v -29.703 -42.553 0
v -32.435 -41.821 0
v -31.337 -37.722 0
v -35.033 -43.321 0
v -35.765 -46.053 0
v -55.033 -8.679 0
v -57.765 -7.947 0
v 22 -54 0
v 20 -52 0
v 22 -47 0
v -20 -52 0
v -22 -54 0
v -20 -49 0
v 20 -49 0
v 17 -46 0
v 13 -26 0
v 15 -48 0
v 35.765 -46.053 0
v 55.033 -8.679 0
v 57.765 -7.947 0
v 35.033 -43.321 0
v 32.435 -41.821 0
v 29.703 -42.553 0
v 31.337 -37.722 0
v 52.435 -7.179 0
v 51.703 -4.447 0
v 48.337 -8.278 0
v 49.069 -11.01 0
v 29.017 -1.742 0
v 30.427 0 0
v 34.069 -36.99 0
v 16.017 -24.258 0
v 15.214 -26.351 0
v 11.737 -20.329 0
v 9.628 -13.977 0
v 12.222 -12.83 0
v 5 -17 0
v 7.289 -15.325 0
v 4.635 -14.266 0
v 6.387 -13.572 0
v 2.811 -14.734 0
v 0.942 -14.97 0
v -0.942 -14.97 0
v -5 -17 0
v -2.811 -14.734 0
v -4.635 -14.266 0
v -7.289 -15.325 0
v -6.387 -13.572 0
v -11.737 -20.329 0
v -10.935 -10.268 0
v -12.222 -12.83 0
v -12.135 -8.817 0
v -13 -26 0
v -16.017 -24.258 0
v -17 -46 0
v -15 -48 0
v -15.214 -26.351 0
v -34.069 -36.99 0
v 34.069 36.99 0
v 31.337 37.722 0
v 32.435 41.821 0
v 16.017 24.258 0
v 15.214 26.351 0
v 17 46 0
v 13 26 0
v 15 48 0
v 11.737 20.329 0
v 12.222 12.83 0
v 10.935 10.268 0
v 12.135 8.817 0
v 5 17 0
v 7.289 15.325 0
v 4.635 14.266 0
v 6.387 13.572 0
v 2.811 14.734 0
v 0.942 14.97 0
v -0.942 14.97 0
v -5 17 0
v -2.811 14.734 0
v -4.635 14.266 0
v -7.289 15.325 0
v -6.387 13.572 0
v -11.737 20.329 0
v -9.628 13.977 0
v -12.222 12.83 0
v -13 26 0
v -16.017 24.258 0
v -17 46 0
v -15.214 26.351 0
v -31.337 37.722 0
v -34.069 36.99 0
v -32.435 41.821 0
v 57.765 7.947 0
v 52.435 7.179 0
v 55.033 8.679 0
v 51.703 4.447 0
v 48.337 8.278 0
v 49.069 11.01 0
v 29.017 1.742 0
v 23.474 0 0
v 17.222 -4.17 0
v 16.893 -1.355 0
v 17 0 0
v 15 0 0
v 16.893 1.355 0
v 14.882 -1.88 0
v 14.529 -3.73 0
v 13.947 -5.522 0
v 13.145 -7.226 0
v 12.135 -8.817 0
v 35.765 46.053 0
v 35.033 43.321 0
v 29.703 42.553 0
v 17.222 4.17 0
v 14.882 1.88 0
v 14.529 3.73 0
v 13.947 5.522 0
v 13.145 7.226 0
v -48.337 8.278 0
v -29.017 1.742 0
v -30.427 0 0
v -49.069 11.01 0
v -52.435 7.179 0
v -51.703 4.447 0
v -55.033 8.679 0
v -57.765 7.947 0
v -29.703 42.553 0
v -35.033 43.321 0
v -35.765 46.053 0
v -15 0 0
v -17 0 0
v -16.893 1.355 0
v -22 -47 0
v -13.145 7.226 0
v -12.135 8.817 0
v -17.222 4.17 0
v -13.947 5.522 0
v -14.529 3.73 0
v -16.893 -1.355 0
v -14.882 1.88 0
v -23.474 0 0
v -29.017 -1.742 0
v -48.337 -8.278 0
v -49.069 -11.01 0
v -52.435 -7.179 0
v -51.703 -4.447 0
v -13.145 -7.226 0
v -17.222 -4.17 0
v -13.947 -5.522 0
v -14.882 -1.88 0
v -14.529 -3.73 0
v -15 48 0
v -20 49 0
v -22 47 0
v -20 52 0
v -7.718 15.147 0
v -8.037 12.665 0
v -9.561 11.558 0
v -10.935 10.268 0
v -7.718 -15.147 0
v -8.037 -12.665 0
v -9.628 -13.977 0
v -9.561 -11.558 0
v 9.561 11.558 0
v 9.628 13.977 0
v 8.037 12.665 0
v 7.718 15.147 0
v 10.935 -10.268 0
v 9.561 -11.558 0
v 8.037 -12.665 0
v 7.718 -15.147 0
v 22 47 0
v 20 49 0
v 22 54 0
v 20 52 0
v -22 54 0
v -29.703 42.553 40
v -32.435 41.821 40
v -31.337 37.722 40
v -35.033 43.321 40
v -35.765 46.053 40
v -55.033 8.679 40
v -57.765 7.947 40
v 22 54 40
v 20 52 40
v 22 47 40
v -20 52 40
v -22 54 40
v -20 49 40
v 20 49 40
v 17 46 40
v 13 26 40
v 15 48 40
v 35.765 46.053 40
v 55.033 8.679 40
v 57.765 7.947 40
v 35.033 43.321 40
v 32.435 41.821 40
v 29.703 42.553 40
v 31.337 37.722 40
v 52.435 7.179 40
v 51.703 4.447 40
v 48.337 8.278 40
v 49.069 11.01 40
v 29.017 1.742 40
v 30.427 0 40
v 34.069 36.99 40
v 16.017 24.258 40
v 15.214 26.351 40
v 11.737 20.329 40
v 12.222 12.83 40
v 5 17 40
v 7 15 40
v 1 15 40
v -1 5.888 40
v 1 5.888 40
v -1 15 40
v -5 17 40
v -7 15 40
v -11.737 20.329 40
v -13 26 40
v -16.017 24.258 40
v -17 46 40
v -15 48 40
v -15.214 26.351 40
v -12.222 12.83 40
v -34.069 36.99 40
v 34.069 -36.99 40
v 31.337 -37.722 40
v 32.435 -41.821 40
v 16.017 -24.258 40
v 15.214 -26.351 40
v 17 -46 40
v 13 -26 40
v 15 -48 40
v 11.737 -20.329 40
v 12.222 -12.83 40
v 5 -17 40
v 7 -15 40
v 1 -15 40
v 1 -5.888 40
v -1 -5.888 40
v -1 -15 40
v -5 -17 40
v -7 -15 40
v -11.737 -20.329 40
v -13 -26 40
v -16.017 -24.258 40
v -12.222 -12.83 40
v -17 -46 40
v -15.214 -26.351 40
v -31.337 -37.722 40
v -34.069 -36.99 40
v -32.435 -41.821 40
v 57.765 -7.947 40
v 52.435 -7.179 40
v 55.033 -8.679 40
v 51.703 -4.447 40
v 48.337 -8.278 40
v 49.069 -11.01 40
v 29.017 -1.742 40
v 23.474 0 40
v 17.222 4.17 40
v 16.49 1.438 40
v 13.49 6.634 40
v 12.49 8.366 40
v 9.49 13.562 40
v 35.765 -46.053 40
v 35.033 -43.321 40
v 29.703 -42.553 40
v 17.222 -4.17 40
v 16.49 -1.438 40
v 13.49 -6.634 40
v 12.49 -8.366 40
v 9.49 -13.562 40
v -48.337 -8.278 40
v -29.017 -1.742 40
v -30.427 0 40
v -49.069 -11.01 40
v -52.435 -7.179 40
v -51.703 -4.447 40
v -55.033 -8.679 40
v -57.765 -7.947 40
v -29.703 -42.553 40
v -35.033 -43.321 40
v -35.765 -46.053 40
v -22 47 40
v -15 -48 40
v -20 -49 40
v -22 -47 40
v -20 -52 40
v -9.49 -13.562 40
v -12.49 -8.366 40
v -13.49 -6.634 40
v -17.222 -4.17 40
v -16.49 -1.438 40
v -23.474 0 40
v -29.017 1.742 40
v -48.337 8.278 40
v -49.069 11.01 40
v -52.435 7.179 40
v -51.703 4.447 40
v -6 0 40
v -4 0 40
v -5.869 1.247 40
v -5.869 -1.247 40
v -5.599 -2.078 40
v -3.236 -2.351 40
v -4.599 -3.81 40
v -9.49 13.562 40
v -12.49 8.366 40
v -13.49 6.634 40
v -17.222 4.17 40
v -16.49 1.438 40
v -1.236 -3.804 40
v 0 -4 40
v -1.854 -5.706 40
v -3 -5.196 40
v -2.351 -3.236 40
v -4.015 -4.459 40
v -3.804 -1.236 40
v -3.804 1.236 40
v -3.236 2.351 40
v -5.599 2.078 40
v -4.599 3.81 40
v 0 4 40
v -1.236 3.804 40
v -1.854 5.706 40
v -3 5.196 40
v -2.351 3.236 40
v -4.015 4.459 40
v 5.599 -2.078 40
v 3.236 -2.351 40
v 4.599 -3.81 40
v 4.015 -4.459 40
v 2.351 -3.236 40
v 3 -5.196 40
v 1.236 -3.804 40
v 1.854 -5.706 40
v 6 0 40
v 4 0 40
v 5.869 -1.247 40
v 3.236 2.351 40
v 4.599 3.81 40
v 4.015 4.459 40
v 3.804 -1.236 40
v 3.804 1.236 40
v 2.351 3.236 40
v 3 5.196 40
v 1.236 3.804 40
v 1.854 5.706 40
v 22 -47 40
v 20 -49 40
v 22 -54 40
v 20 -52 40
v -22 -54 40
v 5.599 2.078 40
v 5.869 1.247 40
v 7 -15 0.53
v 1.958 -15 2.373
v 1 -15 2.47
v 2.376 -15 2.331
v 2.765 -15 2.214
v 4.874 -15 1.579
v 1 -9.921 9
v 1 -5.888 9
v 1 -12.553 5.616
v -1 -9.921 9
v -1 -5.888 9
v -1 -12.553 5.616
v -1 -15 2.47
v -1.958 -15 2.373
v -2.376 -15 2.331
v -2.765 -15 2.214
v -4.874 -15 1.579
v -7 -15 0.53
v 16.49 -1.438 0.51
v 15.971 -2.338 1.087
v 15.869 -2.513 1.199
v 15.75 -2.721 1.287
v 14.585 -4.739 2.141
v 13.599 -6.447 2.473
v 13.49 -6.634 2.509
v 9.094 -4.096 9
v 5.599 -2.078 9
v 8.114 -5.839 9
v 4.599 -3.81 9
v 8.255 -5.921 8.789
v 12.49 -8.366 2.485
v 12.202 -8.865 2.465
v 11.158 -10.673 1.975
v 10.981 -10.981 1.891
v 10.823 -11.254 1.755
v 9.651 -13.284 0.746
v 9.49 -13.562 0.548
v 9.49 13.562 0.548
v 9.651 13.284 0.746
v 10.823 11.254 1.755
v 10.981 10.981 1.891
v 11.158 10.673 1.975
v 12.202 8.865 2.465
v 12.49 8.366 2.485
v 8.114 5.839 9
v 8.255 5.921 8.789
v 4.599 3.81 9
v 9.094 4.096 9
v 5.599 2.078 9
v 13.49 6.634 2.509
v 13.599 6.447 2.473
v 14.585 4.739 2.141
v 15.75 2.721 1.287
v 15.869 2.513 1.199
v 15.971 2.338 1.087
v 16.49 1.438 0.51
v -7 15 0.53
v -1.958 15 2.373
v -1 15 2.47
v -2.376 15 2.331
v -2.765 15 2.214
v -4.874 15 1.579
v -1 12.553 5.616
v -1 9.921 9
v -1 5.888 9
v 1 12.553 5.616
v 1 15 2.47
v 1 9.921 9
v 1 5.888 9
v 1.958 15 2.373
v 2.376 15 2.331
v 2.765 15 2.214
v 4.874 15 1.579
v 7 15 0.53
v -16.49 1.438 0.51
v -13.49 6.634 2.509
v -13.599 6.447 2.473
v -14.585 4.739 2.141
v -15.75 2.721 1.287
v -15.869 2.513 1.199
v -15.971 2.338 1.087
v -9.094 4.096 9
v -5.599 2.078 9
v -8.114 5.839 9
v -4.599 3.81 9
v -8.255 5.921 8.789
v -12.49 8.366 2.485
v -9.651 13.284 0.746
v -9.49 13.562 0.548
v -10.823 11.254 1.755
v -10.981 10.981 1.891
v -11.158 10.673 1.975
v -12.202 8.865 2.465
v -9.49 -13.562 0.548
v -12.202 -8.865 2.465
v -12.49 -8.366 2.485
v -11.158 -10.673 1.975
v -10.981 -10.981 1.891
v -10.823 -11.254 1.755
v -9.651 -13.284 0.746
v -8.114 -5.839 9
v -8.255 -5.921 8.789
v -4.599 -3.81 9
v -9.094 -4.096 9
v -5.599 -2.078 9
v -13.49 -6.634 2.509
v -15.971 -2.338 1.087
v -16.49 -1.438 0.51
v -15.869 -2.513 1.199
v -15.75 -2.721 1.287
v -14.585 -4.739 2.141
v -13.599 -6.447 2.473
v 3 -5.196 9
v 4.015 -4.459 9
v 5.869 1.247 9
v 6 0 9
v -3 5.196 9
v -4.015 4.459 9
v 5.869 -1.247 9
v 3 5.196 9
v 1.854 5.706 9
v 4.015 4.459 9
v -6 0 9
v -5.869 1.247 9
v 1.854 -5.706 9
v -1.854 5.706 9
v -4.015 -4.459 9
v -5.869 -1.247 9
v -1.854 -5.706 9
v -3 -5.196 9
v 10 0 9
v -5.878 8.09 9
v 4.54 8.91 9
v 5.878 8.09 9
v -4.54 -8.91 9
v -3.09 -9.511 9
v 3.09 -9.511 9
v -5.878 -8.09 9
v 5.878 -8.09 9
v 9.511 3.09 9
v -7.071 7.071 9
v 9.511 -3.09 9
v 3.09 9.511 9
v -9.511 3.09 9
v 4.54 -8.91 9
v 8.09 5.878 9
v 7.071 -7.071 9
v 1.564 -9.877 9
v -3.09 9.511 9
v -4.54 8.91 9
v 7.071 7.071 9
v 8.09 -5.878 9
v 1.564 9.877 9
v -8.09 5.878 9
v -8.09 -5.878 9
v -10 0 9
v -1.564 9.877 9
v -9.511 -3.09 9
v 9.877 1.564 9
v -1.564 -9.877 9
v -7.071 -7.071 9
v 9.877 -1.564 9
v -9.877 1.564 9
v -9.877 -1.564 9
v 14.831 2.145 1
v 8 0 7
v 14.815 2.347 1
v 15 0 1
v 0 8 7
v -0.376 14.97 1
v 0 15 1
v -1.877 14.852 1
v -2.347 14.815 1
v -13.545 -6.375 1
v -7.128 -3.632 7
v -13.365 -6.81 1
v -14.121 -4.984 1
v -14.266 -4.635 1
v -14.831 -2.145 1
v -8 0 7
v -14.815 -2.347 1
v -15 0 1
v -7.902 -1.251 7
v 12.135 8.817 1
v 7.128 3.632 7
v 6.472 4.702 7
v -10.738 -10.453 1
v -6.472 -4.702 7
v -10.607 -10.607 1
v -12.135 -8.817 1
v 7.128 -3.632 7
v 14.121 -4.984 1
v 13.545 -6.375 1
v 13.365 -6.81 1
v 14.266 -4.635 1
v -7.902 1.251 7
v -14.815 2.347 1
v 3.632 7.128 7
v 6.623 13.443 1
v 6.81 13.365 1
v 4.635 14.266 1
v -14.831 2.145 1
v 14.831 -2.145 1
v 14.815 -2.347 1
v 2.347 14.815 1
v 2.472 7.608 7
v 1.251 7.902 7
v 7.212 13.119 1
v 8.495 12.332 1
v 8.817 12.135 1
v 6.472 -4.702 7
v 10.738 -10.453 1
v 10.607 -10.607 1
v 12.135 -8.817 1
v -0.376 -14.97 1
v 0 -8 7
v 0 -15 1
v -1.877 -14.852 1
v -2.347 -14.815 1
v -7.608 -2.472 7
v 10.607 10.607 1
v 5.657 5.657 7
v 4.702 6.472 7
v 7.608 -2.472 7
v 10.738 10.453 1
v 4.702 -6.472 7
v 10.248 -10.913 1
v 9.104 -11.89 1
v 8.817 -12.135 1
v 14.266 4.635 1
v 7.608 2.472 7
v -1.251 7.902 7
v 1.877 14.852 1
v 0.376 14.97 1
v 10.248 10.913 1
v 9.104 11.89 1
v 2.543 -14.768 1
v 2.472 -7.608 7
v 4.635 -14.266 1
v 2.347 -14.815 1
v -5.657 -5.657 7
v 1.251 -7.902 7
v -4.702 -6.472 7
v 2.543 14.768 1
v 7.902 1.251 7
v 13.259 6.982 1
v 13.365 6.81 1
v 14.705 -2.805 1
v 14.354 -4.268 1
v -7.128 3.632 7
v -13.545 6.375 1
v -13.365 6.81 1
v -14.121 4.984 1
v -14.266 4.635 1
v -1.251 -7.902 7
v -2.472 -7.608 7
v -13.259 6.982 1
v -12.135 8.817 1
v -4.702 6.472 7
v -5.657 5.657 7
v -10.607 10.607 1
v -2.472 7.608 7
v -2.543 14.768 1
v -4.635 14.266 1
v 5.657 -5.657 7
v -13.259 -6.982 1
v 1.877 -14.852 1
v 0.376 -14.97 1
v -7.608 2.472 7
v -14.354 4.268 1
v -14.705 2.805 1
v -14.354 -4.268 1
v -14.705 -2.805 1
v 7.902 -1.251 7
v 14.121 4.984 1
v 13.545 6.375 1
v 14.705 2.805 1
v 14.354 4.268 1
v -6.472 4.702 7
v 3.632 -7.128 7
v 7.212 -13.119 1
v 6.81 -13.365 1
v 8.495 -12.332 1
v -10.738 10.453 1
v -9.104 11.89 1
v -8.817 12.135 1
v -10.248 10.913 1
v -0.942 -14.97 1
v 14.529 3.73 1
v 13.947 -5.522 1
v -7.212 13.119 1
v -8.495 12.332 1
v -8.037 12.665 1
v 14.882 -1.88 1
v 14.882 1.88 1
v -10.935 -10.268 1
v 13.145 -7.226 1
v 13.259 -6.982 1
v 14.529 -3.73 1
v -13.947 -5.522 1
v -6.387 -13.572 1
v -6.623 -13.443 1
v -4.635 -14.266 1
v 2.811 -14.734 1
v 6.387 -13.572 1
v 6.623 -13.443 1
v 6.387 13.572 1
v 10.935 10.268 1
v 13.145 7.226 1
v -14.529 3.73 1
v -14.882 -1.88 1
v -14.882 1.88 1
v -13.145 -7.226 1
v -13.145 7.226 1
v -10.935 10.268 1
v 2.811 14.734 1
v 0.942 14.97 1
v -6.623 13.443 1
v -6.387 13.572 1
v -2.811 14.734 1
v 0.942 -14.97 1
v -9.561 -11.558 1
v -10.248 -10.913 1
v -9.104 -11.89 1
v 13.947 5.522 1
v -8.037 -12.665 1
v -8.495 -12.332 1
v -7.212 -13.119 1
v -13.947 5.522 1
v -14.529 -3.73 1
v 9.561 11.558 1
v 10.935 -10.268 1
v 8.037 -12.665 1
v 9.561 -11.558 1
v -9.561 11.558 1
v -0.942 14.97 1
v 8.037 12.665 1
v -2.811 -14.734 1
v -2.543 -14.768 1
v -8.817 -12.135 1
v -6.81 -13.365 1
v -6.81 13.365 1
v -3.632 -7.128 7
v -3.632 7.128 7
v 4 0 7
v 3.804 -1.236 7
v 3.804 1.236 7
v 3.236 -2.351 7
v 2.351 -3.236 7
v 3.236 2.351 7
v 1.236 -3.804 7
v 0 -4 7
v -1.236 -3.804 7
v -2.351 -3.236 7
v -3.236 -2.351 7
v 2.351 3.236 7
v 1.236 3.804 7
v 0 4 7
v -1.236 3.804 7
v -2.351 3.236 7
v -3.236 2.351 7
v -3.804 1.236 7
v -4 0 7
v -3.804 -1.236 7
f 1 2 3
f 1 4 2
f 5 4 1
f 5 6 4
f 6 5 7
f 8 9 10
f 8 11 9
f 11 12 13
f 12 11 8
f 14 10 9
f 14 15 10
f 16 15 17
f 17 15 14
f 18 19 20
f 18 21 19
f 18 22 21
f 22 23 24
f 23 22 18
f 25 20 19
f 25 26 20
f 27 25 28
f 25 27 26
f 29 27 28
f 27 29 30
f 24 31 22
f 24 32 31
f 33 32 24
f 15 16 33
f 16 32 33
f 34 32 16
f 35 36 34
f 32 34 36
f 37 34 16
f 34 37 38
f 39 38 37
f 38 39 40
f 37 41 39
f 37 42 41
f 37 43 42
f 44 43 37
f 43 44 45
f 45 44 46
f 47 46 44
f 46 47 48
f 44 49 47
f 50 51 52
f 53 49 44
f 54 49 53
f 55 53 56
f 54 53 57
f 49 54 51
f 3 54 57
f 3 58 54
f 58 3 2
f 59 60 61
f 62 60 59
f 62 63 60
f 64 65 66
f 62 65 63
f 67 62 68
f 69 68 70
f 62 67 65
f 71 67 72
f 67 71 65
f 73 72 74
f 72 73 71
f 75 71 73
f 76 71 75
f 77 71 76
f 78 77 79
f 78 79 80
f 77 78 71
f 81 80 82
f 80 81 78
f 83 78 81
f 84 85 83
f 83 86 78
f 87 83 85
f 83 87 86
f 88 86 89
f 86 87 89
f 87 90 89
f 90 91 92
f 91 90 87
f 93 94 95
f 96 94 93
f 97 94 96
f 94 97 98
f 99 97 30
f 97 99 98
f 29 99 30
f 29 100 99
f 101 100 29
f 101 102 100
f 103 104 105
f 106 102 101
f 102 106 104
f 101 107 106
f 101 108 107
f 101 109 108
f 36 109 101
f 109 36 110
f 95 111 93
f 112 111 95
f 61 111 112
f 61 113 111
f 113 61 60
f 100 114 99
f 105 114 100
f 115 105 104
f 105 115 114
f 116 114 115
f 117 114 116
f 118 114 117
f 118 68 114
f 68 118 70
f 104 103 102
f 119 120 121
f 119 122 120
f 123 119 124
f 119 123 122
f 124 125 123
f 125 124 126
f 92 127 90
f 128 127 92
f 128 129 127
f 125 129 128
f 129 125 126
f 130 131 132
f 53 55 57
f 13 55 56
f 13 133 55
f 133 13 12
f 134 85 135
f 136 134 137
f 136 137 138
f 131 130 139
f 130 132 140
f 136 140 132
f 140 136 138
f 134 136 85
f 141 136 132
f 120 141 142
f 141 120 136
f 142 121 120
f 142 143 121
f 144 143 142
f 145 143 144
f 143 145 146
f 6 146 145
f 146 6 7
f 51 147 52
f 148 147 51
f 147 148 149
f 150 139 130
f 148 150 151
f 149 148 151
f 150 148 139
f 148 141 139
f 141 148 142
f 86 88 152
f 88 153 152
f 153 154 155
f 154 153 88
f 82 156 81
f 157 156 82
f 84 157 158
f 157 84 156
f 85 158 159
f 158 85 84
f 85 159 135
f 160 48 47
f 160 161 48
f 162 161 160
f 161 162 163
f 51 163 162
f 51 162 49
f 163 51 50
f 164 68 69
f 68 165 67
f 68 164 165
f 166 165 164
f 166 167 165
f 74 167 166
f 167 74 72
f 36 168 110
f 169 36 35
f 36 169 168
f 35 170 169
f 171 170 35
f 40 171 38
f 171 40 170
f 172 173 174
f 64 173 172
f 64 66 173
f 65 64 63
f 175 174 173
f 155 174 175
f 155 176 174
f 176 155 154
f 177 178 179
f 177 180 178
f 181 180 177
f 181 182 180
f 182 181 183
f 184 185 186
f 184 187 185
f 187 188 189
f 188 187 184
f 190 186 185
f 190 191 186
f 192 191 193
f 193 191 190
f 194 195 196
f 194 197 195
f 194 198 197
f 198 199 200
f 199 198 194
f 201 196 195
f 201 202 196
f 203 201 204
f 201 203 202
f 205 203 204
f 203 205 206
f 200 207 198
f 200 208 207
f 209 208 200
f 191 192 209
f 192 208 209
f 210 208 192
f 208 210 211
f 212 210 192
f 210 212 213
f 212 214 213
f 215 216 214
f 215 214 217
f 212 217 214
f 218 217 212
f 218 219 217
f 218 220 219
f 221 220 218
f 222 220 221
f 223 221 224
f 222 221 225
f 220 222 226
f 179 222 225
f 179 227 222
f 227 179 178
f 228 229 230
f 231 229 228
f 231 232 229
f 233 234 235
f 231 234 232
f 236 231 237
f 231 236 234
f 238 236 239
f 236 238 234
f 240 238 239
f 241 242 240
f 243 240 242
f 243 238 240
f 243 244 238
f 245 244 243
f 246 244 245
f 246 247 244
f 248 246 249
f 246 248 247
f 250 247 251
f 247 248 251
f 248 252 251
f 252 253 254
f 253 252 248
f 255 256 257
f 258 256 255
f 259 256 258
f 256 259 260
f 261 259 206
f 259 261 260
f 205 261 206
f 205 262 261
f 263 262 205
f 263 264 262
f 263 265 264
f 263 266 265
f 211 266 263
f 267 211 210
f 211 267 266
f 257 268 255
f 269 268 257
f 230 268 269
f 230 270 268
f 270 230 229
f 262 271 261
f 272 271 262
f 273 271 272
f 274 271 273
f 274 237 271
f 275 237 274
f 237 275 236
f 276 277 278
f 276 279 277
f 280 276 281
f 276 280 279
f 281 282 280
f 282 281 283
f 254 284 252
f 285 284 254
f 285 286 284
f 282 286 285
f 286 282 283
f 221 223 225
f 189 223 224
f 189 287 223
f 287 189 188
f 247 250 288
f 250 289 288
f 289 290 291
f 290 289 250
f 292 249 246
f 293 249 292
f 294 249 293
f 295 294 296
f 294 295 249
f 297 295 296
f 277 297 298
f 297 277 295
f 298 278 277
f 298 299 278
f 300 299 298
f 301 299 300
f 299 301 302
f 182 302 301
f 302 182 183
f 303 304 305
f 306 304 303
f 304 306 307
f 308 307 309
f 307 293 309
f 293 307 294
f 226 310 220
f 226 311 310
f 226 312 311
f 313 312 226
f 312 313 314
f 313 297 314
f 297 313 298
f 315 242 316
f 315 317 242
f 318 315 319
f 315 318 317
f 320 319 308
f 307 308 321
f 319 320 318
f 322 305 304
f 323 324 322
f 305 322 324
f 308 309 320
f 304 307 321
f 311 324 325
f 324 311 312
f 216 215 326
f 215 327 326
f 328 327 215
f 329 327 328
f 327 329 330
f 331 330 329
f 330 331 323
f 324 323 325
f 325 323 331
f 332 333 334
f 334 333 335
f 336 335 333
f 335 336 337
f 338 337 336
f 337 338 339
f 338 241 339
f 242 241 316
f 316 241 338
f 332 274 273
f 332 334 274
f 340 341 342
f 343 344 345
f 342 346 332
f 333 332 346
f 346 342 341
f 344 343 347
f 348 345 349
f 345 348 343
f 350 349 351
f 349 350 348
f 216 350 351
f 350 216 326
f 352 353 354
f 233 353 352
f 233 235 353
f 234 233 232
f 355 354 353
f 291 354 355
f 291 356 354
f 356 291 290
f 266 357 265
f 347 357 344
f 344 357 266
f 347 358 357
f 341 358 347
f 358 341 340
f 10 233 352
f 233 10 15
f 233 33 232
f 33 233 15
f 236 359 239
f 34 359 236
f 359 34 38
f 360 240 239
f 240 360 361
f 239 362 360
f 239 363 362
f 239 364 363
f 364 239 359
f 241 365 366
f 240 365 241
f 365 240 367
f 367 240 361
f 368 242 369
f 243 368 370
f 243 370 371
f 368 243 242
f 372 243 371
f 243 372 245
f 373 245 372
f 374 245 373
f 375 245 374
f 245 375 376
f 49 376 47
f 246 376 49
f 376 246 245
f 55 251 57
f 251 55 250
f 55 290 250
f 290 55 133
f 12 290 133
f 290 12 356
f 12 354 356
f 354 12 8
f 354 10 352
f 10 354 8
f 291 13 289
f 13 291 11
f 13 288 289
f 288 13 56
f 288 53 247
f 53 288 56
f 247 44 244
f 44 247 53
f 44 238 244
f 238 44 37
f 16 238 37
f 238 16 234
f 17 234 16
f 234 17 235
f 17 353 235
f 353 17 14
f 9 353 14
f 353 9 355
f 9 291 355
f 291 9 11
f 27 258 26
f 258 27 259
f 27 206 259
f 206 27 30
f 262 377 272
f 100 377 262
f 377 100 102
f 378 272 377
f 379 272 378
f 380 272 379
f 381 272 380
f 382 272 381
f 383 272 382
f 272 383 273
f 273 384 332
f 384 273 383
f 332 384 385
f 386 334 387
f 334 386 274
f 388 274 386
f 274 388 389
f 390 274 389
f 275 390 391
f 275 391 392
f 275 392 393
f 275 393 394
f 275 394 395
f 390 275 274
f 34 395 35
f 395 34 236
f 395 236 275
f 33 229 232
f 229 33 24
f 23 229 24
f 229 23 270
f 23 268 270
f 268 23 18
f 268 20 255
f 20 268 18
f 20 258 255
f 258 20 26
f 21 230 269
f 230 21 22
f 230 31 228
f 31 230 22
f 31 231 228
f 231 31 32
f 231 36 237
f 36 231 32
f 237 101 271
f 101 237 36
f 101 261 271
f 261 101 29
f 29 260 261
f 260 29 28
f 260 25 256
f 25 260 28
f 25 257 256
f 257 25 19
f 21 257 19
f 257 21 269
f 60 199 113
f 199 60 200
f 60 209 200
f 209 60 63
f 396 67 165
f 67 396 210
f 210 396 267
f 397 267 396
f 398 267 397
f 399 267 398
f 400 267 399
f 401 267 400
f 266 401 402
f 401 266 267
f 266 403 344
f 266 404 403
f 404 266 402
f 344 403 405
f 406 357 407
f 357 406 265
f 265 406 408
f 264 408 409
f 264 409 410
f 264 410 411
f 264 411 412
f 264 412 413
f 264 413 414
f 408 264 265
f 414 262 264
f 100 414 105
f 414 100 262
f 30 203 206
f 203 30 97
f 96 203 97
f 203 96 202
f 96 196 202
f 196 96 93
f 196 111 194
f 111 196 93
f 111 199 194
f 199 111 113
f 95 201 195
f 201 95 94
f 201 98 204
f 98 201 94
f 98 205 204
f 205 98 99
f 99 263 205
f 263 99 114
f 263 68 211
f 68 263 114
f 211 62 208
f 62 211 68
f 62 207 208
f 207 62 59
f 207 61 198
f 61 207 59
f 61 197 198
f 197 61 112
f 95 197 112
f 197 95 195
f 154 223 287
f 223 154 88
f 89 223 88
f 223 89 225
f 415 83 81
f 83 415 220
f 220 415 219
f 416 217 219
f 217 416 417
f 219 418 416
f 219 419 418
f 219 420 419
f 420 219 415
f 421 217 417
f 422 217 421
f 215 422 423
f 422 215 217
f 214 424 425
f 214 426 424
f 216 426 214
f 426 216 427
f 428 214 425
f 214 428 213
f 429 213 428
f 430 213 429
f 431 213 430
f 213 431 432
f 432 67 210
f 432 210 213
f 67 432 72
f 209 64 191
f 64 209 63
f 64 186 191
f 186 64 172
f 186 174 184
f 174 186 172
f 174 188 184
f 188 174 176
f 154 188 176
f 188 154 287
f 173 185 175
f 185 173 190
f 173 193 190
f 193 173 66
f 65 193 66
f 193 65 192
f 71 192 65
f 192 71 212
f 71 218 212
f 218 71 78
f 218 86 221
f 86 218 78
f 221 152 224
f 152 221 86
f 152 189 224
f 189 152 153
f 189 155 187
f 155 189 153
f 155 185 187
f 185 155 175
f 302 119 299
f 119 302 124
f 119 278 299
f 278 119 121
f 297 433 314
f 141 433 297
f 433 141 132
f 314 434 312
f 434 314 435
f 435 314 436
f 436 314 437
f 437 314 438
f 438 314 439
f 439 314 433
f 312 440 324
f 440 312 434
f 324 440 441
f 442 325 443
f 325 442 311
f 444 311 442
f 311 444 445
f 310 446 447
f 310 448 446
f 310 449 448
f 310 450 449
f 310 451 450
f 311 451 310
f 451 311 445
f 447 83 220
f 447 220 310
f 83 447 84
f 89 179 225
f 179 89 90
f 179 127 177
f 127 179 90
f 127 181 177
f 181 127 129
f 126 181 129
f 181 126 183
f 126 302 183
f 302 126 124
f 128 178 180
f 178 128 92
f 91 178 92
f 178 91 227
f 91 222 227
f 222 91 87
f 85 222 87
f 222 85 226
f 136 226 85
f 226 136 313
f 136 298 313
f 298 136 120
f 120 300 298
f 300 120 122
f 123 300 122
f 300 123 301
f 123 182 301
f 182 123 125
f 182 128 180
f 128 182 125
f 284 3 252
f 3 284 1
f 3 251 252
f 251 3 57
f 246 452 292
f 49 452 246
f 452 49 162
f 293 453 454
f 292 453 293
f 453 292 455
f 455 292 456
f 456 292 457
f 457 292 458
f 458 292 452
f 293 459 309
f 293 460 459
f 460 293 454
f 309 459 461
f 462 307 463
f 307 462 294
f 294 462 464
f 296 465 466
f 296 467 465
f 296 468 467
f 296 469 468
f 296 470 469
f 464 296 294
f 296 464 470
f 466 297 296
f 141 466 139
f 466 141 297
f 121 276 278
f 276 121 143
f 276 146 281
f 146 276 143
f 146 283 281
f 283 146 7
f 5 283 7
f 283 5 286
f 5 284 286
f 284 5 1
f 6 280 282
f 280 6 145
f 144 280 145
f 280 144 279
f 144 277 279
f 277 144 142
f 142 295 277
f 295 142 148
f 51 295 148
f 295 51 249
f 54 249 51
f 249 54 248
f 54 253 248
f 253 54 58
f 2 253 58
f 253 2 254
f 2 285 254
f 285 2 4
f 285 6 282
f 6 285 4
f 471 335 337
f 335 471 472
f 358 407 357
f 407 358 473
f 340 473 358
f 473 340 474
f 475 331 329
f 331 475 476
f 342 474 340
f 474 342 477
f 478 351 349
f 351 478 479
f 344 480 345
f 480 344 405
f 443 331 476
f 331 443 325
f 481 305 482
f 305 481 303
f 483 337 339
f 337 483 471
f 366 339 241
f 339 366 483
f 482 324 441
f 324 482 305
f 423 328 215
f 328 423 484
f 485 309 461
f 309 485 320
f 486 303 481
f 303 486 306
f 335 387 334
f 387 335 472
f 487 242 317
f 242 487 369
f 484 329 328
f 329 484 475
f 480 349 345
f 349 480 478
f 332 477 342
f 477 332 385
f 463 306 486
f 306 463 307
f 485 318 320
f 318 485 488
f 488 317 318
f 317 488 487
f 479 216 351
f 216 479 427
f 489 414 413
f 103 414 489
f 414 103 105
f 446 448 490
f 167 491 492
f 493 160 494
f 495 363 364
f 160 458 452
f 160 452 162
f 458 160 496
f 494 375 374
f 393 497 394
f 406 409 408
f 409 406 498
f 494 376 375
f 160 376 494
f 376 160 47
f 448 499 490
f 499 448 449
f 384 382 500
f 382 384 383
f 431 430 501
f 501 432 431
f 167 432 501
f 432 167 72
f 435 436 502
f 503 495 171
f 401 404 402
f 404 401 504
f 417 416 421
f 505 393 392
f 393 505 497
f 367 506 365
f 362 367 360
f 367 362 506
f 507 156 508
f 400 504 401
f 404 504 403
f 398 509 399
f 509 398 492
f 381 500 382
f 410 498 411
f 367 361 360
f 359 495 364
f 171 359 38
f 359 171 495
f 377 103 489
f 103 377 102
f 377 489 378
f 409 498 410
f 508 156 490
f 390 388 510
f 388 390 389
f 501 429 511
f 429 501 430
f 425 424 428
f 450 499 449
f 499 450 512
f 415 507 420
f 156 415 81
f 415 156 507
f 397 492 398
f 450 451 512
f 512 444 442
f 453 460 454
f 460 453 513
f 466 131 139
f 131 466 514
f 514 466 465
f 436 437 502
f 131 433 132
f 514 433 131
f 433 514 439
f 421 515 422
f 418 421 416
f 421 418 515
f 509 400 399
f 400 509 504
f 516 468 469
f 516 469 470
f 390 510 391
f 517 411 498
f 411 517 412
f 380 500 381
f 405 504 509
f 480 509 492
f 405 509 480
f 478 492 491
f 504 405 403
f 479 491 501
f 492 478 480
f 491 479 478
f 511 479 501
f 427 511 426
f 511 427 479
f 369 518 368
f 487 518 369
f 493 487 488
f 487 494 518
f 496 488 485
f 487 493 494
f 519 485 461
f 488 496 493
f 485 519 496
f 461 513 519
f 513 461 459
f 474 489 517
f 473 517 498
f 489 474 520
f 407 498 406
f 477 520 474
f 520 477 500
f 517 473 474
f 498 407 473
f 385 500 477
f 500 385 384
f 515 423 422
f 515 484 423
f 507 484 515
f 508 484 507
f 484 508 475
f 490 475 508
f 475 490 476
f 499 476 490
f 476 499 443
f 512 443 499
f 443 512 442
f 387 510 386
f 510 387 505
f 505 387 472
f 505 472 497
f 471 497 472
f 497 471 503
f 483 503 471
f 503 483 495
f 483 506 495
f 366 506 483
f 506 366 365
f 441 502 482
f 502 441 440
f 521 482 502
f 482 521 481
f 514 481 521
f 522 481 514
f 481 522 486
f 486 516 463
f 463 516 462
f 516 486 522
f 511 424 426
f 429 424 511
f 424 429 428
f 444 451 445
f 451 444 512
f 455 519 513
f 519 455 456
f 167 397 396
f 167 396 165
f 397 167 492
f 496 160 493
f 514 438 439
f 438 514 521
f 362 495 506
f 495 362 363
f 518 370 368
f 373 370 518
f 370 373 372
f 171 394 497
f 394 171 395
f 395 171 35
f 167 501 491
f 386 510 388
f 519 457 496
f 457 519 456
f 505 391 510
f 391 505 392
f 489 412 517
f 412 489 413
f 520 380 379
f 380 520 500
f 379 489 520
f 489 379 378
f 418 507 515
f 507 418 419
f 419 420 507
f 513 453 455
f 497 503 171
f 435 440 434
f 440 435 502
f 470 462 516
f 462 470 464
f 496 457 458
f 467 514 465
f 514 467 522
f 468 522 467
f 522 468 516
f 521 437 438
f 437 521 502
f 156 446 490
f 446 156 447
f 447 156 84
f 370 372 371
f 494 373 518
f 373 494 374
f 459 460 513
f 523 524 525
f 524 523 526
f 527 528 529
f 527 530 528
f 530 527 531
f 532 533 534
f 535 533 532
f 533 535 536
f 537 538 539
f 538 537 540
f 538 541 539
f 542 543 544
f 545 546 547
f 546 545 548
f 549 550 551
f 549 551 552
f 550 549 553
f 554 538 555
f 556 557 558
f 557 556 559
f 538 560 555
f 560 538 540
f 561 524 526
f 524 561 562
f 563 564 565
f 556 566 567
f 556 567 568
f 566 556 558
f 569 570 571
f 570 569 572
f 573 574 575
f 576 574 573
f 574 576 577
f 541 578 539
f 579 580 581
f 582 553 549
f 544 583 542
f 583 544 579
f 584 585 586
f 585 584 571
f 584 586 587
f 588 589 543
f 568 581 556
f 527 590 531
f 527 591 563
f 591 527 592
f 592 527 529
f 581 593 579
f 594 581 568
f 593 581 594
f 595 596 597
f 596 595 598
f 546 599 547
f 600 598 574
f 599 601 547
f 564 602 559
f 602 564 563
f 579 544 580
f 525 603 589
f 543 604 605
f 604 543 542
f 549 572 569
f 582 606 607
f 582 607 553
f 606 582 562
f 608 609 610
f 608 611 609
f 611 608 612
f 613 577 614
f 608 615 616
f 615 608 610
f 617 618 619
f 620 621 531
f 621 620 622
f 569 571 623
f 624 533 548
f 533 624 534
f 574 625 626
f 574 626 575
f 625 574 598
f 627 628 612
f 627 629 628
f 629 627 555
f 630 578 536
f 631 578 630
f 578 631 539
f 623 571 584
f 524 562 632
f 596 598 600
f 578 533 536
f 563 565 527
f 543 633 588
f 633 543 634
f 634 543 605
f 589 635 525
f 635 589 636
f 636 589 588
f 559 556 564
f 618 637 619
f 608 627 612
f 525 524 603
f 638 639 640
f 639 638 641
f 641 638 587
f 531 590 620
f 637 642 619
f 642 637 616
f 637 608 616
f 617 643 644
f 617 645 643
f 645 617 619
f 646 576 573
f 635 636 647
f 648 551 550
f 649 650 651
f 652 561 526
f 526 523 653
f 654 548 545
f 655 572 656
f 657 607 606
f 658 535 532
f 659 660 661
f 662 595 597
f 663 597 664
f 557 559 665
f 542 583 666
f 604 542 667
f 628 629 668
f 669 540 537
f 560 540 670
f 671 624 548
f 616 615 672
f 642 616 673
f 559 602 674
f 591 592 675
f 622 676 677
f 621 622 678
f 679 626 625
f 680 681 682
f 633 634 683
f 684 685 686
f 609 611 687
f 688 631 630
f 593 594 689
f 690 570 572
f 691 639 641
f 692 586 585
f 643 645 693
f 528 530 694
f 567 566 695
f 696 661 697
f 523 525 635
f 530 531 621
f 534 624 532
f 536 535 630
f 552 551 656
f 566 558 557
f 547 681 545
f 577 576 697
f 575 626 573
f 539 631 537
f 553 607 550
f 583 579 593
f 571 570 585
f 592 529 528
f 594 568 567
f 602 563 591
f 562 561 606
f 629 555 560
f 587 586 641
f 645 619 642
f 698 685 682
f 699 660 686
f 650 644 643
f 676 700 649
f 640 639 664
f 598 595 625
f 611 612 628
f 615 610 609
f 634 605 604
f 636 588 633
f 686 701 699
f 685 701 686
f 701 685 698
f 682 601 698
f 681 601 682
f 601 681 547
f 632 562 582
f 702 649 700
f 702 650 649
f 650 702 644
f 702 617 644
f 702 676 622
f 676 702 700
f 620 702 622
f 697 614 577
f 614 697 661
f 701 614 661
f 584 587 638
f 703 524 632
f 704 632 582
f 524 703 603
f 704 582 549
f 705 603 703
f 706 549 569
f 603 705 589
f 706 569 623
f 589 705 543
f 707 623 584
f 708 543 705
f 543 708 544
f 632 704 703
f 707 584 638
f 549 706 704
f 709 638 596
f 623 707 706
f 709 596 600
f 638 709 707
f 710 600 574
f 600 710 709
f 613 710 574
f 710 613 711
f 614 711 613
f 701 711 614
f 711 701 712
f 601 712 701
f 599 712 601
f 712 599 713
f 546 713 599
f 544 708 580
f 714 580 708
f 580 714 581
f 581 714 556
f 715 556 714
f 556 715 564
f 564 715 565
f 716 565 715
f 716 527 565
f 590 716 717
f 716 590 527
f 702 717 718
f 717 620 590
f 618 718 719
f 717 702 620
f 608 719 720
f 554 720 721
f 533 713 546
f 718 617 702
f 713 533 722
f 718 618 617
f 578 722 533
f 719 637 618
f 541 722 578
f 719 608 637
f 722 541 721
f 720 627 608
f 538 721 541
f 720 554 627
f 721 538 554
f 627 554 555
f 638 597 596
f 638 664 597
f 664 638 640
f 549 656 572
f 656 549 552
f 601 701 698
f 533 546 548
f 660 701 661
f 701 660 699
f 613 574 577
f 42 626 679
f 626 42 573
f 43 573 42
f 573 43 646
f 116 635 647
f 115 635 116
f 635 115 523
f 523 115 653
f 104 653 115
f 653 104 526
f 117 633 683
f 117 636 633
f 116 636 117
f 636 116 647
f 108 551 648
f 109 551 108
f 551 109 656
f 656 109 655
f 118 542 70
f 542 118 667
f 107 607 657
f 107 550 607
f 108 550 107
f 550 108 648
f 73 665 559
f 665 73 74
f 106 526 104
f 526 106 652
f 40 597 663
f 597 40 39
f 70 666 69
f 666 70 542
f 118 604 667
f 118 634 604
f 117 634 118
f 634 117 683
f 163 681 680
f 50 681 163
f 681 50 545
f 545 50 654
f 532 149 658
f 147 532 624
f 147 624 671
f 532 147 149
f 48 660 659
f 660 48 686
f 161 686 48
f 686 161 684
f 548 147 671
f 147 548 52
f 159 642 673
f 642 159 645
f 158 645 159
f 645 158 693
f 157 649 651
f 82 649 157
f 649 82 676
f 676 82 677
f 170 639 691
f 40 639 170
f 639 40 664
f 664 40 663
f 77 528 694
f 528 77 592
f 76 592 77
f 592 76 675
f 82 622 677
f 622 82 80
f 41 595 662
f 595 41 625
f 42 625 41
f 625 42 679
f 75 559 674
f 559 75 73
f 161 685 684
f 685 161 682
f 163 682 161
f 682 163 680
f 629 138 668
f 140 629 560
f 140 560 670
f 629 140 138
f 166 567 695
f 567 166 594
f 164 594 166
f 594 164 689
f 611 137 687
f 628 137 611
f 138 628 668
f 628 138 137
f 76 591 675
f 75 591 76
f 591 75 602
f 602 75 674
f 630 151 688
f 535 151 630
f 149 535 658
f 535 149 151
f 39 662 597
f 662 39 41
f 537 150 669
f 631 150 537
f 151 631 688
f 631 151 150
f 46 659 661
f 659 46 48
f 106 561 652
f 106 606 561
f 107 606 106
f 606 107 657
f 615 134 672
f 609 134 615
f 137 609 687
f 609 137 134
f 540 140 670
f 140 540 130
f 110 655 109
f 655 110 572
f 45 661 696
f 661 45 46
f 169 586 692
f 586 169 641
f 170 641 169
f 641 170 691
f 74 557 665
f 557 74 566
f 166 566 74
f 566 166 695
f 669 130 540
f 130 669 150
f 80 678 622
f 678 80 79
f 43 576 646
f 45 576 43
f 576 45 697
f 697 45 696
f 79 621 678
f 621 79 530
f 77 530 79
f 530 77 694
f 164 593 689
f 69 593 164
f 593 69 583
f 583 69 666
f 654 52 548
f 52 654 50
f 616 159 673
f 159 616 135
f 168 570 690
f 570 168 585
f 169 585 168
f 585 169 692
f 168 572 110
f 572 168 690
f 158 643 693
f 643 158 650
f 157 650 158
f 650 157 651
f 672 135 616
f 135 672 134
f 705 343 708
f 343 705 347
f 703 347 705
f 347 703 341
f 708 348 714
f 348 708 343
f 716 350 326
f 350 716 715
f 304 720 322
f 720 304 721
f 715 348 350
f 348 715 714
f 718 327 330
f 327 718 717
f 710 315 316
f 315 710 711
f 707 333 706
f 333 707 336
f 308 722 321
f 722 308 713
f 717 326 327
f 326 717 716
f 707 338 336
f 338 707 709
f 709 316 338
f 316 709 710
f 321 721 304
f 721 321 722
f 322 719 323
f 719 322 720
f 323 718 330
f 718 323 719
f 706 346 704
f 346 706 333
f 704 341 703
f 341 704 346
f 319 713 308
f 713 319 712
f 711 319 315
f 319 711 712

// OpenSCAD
// file: poddispenser_common.scad
/* ************************************************************************** */
// global variables
// dispenser [inner] radius: the dispenser is cylindrical ...
// thickness of most walls and structures
/* ************************************************************************** */

g_dispenser_radius=60;
g_wallthickness=2;

/* ************************************************************************** */
// definitions for the VMA401 stepper motor
// motorheight is the height of the vma401 stepper motor, all the way to the useful part of the axle
// motoroffset is how offcenter the vma401 axle is
// motordia is the diameter of the vma401 motor
/* ************************************************************************** */

g_motorheight=23;
g_motordia=28;
g_motoroffset=7;
g_motorflapdepth=3;

/* ************************************************************************** */
// definitions for axle bearing
/* ************************************************************************** */

g_bearingheight=7;
g_bearingdia=22;

/* ************************************************************************** */
/* cutout for capsule viewed sideways. This cutout is comfortably larger      */
/* than needed to pass the capsule                                            */
/* ************************************************************************** */

module capsule_cutout() {
    polygon(points=[[-20,0],[20,0],[20,3],[15,4],[13,26],[5,35],[-5,35],[-13,26],[-15,4],[-20,3]]);
}

/* ************************************************************************** */
/* a 2mm wide wall around the cutout                                          */
/* ************************************************************************** */

module capsule_cutout_outer() {
    polygon(points=[[-22,-2],[22,-2],[22,5],[17,6],[15,28],[7,37],[1,37],[1,47],[-1,47],[-1,37],[-7,37],[-15,28],[-17,6],[-22,5]]);
}

/* ************************************************************************** */
/* ************************************************************************** */

module capsule_cutout_widebrim() {
    polygon(points=[[-20,-5],[20,-5],[20,3],[15,4],[13,26],[5,35],[-5,35],[-13,26],[-15,4],[-20,3]]);
}

/* ************************************************************************** */
// inner + outer capsule, open at the end
/* ************************************************************************** */

module capsule_outline_open() {
    polygon(points=[[20,0],[20,3],[15,4],[13,26],[5,35],
                            [-5,35],[-13,26],[-15,4],[-20,3],[-20,-2],
                            [-22,-2],[-22,5],[-17,6],[-15,28],[-7,37],
                            [-1,37],[-1,65],[1,65],[1,37],
                            [7,37],[15,28],[17,6],[22,5],[22,-2],[20,-2]]);
    
    
}

/* ************************************************************************** */
/* rimmed outer wall around object.
/* ************************************************************************** */

module rimmedwall(wallheight=60, radius=g_dispenser_radius) {
    difference() {
        union() {
            cylinder($fn=100,r=radius+g_wallthickness,h=wallheight);
            translate([0,0,wallheight-3]) cylinder($fn=100,r1=radius+g_wallthickness,r2=radius+g_wallthickness+1,h=4);
	    // ridges on the wall to improve printing
	    for (angle=[0:30:360])
	        rotate([0,0,angle])
	            translate([radius, 0, 1])
		        cylinder($fn=20,r=g_wallthickness+1,h=wallheight-1);
        }
        union() {
            translate([0,0,-1]) cylinder($fn=100,r=radius,h=wallheight+3);
            translate([0,0,wallheight]) cylinder($fn=100,r=radius+g_wallthickness,h=3);
        }
    }
}

/* ************************************************************************** */
// bearing seat
/* ************************************************************************** */

module bearingholder_plus() {
    cylinder($fn=30,r=g_bearingdia/2+3,h=g_bearingheight+2);
}

/* ************************************************************************** */
/* bearing cutout
/* ************************************************************************** */
module bearingholder_minus() {
     translate([0,0,g_wallthickness]) cylinder($fn=40,r=g_bearingdia/2+0.1,h=g_bearingheight+1);
}



/* ************************************************************************** */
/* a pair of object that leave holes for screws on the axle */
/* ************************************************************************** */

module screw_cone_plus() {
    cylinder($fn=40,r1=17,r2=10,h=9);
}

module screw_cone_minus() {
    translate([0,0,1]) cylinder($fn=40,r1=15,r2=8,h=6);
    cylinder($fn=50,r=15,h=1);
}
// main file
use <poddispenser_common.scad>


module poddispenser_holder (wallheight=40) {
    difference() {
        union() {
            // six holding channels
            for (angle=[0,60,120,180,240,300]) {
                rotate([0,0,angle]) 
                    translate([0,-52,0])
                        linear_extrude(height=wallheight) 
                            difference() {
                                capsule_cutout_outer();
                                capsule_cutout();
                            }
            }
            // axle 
            cylinder($fn=30, r=6, h=wallheight);
            screw_cone_plus();
        }
        union() {
            // axle hole
            translate([0,0,-1]) cylinder($fn=20,r=4,h=wallheight+2);
            screw_cone_minus();
        }
    }
}

poddispenser_holder();
